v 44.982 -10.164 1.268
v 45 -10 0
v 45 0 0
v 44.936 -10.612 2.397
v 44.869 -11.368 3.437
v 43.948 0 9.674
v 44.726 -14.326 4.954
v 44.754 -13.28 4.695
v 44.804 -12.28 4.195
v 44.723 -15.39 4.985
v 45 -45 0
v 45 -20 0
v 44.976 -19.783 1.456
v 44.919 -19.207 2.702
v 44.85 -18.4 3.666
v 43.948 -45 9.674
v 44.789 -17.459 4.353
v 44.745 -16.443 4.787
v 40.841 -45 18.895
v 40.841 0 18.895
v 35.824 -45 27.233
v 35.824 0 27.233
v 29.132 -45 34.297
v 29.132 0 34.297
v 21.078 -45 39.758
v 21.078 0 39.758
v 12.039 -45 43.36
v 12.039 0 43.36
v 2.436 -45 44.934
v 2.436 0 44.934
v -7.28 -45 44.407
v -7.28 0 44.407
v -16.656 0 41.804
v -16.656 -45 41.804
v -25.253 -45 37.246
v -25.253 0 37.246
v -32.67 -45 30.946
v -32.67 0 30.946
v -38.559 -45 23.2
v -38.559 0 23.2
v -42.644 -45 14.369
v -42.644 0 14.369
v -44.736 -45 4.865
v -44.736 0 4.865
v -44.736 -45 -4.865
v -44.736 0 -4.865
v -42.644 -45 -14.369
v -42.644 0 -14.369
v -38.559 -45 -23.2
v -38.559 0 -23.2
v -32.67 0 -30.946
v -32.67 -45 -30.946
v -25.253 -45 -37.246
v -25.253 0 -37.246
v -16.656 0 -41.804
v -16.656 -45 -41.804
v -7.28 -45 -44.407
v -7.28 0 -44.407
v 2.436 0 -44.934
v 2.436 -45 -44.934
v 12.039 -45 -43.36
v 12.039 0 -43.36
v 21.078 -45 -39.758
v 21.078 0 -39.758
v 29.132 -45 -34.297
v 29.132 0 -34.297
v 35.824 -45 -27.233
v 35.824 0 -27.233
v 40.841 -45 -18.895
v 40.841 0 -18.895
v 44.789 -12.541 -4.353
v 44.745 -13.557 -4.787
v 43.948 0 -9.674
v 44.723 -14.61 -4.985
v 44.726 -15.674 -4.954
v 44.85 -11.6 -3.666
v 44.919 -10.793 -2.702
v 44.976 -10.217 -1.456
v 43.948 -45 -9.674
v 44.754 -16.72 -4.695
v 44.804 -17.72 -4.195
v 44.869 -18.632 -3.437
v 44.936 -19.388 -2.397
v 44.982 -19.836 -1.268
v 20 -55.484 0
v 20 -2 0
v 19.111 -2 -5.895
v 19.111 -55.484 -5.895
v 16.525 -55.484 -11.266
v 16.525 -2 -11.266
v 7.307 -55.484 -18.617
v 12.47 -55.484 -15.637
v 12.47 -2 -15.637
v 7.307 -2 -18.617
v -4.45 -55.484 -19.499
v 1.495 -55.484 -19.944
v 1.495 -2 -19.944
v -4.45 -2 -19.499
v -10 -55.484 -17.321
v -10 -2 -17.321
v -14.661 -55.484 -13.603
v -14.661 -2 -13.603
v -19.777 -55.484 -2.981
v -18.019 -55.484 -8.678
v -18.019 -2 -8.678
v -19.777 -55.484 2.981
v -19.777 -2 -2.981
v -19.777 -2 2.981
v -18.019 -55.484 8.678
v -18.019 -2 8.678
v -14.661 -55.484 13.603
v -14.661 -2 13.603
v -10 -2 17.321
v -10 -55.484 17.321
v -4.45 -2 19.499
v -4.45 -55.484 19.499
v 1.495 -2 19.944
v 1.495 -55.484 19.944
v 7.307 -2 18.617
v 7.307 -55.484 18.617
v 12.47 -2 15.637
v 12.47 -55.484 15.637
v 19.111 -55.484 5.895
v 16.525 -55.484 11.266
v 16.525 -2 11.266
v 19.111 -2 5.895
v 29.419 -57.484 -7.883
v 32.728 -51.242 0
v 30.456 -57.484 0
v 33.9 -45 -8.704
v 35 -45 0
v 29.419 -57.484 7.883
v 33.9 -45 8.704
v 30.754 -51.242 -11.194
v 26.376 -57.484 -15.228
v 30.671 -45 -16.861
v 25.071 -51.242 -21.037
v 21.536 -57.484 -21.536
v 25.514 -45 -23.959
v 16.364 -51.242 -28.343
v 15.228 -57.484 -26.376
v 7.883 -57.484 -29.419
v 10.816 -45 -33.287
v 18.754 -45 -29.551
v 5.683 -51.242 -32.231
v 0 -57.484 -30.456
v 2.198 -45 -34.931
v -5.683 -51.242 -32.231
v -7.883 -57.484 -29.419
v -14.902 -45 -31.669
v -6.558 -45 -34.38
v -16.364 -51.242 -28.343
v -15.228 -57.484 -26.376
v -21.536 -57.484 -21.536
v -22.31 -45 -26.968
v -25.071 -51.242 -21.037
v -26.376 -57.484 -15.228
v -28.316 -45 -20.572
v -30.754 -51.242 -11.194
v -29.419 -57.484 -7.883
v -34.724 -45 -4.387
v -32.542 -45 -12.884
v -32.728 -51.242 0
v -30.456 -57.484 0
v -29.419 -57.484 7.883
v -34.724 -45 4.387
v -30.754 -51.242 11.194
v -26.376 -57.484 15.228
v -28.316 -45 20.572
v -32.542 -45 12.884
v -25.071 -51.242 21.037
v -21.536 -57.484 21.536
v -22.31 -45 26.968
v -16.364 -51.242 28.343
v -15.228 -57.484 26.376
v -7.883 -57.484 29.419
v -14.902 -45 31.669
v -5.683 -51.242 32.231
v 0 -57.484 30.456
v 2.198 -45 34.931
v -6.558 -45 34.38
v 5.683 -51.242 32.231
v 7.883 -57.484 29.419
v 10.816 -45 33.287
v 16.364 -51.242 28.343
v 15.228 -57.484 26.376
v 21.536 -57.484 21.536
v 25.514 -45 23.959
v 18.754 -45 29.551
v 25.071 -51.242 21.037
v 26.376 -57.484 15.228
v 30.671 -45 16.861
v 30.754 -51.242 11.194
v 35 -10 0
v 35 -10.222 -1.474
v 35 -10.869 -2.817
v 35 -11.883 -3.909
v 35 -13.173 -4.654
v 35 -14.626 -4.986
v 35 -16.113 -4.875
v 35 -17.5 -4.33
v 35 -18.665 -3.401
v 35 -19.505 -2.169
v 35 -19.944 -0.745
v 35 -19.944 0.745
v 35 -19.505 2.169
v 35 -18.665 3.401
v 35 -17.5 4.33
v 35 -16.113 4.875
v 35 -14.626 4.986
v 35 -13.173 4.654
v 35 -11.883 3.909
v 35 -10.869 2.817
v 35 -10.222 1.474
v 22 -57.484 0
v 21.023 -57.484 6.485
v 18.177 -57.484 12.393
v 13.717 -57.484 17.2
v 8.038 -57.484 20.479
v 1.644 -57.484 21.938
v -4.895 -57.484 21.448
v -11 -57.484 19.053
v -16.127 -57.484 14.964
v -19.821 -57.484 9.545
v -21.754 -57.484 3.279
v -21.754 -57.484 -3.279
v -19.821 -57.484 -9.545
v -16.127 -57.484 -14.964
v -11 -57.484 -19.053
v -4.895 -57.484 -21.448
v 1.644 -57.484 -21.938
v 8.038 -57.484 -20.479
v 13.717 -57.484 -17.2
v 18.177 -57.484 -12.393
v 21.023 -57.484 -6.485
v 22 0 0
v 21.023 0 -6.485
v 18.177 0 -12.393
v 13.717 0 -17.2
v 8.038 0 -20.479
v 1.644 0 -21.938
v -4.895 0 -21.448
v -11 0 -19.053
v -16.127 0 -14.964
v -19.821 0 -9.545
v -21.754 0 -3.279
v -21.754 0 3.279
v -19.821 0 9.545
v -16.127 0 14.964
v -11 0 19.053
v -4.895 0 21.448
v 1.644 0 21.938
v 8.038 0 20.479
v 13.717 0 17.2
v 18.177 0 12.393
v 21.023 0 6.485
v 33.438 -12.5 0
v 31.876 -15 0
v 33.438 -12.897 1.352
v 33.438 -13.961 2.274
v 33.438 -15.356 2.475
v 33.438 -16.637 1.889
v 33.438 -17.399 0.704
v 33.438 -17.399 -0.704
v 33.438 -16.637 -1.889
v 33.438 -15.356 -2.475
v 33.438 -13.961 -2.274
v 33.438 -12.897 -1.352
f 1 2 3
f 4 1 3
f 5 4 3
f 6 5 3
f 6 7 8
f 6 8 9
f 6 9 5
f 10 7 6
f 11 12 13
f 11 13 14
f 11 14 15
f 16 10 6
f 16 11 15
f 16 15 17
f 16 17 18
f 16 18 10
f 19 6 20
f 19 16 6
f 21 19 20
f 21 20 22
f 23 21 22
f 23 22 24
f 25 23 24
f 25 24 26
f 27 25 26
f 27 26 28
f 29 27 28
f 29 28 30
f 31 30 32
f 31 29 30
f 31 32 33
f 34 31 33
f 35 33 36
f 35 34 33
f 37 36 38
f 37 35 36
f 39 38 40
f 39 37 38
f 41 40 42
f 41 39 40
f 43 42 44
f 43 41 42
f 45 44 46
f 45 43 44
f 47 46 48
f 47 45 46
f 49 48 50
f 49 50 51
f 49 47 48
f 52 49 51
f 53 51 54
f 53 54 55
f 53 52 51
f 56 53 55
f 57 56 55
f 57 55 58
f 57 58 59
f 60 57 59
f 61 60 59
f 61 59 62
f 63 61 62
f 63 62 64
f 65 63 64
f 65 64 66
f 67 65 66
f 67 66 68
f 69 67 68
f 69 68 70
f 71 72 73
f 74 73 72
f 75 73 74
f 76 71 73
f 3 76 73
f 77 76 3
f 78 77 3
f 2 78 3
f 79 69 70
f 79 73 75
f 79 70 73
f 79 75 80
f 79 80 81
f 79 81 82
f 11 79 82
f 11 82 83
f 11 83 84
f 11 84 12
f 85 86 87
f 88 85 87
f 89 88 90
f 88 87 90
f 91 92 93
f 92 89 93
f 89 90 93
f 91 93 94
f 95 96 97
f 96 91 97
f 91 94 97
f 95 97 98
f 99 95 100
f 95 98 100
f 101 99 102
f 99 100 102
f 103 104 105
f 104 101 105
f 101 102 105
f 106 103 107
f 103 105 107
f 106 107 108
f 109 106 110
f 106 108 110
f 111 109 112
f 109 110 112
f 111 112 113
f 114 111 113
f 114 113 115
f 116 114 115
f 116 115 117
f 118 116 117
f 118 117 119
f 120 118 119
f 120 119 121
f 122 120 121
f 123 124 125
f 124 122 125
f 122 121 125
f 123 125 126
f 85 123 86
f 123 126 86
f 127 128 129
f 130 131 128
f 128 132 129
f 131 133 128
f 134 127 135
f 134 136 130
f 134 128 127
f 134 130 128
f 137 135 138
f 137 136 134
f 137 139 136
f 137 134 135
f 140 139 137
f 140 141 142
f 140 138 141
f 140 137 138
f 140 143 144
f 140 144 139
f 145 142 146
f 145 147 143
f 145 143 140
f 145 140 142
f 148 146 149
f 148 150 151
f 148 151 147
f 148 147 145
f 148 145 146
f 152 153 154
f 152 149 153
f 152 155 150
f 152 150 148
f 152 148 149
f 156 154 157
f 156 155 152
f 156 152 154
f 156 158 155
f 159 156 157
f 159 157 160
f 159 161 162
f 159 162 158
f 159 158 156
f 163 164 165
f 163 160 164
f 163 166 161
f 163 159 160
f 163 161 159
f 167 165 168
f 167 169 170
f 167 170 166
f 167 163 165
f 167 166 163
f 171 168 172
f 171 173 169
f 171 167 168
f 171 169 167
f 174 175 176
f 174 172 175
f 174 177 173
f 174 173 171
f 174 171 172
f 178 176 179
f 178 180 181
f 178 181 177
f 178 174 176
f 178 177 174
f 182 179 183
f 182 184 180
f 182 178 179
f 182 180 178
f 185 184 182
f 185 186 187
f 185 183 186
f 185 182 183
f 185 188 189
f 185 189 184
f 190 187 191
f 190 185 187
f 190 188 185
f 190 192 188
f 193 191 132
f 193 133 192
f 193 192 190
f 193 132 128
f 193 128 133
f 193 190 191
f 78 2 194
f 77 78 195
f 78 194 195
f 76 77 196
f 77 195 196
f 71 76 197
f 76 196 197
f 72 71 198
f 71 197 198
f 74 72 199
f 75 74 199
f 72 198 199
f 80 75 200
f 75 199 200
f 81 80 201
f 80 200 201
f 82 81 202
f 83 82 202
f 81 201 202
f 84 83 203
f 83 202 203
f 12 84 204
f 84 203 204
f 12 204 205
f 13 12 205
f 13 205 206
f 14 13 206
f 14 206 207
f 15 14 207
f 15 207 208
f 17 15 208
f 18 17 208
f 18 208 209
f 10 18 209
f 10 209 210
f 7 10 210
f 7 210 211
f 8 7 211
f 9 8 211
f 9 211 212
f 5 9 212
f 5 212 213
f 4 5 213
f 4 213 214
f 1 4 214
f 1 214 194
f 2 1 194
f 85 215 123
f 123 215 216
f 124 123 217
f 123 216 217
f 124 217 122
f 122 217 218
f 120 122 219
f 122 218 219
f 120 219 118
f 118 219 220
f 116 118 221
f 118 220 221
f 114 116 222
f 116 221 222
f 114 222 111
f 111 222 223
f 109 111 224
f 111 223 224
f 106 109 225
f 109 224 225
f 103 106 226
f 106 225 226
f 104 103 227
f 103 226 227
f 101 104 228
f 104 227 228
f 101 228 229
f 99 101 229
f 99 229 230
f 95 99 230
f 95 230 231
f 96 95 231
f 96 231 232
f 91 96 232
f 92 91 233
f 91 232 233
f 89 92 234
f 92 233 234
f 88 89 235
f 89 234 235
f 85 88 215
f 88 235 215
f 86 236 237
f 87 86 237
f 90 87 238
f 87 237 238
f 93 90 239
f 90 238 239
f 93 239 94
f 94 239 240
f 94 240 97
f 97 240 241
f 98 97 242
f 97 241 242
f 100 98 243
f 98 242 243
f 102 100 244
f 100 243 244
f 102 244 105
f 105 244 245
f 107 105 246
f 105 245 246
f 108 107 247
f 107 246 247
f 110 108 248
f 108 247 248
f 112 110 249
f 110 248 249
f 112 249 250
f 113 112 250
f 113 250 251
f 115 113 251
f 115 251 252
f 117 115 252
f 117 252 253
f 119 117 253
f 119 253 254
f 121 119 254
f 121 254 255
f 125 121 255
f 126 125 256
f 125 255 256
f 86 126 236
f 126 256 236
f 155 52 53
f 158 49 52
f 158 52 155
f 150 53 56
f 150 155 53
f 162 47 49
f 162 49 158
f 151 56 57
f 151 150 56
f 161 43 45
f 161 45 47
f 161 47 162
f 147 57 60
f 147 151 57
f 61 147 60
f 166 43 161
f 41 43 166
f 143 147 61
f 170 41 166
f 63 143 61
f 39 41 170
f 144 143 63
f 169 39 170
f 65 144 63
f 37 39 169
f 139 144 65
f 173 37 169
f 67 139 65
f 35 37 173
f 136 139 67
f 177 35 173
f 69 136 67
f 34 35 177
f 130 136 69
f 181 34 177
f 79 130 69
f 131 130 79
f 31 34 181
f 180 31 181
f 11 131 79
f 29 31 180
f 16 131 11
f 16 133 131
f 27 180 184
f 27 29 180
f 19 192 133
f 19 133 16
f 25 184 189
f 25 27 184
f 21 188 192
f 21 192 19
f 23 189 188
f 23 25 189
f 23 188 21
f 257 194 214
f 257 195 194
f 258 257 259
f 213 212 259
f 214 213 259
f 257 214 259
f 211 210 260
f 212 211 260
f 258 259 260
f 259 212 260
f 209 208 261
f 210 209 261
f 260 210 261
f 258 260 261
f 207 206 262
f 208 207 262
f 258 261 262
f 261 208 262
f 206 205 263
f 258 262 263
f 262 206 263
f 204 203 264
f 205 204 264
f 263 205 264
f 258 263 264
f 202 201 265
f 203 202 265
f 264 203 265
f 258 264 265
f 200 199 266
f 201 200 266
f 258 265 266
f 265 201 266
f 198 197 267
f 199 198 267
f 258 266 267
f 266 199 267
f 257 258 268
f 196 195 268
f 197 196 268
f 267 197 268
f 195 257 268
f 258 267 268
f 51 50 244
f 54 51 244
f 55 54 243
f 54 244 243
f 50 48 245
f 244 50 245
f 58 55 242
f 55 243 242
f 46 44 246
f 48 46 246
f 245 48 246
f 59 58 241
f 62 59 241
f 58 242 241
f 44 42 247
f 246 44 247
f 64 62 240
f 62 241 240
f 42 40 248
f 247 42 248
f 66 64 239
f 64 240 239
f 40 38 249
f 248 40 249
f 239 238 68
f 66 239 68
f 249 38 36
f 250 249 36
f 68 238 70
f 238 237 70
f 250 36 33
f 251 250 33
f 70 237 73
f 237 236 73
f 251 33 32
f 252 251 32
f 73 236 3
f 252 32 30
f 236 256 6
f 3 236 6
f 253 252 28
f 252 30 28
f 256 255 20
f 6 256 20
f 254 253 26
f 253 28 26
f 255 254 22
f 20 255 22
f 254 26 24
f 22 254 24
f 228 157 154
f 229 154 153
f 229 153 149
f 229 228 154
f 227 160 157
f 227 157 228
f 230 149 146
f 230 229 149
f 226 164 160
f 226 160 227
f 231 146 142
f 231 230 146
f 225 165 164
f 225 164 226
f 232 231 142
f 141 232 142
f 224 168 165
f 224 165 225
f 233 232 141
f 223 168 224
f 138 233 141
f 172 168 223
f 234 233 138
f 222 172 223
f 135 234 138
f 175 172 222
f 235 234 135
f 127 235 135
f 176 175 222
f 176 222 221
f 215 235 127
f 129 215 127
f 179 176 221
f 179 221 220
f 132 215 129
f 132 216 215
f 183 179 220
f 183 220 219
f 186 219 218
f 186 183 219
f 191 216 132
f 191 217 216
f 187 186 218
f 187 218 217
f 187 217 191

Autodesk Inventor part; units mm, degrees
ref_plane "YZ Plane" through (0, 0, 0) normal (1, 0, 0) x (0, 1, 0)
ref_plane "XZ Plane" through (0, 0, 0) normal (0, 1, 0) x (-1, 0, 0)
ref_plane "XY Plane" through (0, 0, 0) normal (0, 0, 1) x (1, 0, 0)
sketch "Эскиз1" plane through (0, 0, 0) normal (0, 0, 1) x (1, 0, 0)
  line L0 (0, 0) -> (45, 0)
  line L1 (45, 0) -> (45, -45)
  line L2 (45, -45) -> (35, -45)
  line L3 (20, -65) -> (20, 0)
  line L4 (35, -45) -> (27.6938, -65.0737)
  line L5 (20, -57.4838) -> (30.4563, -57.4838)
  line L6 (0, 0) -> (0, -13.3093)
  dimension "d0" = 45
  dimension "d1" = 45
  dimension "d2" = 10
  dimension "d5" = 20
  dimension "d6" = 110
revolve "Вращение1" add sketch "Эскиз1" angle 360 about axis through (0, 0, 0) along (0, -1, 0)
thread "Резьба1" size "M40x3" class "6H" standard "ANSI Metric M Profile" full length
chamfer "Фаска1" distance 2 angle 45 2 edges at (-20, 0, 0) (-20, -57.4838, 0)
sketch "Эскиз2" plane through (0, 0, 0) normal (0, 0, 1) x (1, 0, 0)
  line L0 (45, 0) -> (45, -45) projected
  line L1 (45, 0) -> (45, -15)
  line L2 (45, -15) -> (34.4215, -15)
  line L3 (45, -15) -> (45, -10)
  line L4 (45, -10) -> (35, -10)
  line L5 (35, -10) -> (31.8757, -15)
  line L6 (34.4215, -15) -> (31.8757, -15)
  point P0 (0, 0)
  dimension "d13" = 15
  dimension "d14" = 5
  dimension "d15" = 10
  dimension "d17" = 58
revolve "Вращение2" cut sketch "Эскиз2" angle 360 about axis through (45, -15, 0) along (-1, 0, 0)
properties part number "Гайка шток-поршень" material "Сталь, углеродистая"
